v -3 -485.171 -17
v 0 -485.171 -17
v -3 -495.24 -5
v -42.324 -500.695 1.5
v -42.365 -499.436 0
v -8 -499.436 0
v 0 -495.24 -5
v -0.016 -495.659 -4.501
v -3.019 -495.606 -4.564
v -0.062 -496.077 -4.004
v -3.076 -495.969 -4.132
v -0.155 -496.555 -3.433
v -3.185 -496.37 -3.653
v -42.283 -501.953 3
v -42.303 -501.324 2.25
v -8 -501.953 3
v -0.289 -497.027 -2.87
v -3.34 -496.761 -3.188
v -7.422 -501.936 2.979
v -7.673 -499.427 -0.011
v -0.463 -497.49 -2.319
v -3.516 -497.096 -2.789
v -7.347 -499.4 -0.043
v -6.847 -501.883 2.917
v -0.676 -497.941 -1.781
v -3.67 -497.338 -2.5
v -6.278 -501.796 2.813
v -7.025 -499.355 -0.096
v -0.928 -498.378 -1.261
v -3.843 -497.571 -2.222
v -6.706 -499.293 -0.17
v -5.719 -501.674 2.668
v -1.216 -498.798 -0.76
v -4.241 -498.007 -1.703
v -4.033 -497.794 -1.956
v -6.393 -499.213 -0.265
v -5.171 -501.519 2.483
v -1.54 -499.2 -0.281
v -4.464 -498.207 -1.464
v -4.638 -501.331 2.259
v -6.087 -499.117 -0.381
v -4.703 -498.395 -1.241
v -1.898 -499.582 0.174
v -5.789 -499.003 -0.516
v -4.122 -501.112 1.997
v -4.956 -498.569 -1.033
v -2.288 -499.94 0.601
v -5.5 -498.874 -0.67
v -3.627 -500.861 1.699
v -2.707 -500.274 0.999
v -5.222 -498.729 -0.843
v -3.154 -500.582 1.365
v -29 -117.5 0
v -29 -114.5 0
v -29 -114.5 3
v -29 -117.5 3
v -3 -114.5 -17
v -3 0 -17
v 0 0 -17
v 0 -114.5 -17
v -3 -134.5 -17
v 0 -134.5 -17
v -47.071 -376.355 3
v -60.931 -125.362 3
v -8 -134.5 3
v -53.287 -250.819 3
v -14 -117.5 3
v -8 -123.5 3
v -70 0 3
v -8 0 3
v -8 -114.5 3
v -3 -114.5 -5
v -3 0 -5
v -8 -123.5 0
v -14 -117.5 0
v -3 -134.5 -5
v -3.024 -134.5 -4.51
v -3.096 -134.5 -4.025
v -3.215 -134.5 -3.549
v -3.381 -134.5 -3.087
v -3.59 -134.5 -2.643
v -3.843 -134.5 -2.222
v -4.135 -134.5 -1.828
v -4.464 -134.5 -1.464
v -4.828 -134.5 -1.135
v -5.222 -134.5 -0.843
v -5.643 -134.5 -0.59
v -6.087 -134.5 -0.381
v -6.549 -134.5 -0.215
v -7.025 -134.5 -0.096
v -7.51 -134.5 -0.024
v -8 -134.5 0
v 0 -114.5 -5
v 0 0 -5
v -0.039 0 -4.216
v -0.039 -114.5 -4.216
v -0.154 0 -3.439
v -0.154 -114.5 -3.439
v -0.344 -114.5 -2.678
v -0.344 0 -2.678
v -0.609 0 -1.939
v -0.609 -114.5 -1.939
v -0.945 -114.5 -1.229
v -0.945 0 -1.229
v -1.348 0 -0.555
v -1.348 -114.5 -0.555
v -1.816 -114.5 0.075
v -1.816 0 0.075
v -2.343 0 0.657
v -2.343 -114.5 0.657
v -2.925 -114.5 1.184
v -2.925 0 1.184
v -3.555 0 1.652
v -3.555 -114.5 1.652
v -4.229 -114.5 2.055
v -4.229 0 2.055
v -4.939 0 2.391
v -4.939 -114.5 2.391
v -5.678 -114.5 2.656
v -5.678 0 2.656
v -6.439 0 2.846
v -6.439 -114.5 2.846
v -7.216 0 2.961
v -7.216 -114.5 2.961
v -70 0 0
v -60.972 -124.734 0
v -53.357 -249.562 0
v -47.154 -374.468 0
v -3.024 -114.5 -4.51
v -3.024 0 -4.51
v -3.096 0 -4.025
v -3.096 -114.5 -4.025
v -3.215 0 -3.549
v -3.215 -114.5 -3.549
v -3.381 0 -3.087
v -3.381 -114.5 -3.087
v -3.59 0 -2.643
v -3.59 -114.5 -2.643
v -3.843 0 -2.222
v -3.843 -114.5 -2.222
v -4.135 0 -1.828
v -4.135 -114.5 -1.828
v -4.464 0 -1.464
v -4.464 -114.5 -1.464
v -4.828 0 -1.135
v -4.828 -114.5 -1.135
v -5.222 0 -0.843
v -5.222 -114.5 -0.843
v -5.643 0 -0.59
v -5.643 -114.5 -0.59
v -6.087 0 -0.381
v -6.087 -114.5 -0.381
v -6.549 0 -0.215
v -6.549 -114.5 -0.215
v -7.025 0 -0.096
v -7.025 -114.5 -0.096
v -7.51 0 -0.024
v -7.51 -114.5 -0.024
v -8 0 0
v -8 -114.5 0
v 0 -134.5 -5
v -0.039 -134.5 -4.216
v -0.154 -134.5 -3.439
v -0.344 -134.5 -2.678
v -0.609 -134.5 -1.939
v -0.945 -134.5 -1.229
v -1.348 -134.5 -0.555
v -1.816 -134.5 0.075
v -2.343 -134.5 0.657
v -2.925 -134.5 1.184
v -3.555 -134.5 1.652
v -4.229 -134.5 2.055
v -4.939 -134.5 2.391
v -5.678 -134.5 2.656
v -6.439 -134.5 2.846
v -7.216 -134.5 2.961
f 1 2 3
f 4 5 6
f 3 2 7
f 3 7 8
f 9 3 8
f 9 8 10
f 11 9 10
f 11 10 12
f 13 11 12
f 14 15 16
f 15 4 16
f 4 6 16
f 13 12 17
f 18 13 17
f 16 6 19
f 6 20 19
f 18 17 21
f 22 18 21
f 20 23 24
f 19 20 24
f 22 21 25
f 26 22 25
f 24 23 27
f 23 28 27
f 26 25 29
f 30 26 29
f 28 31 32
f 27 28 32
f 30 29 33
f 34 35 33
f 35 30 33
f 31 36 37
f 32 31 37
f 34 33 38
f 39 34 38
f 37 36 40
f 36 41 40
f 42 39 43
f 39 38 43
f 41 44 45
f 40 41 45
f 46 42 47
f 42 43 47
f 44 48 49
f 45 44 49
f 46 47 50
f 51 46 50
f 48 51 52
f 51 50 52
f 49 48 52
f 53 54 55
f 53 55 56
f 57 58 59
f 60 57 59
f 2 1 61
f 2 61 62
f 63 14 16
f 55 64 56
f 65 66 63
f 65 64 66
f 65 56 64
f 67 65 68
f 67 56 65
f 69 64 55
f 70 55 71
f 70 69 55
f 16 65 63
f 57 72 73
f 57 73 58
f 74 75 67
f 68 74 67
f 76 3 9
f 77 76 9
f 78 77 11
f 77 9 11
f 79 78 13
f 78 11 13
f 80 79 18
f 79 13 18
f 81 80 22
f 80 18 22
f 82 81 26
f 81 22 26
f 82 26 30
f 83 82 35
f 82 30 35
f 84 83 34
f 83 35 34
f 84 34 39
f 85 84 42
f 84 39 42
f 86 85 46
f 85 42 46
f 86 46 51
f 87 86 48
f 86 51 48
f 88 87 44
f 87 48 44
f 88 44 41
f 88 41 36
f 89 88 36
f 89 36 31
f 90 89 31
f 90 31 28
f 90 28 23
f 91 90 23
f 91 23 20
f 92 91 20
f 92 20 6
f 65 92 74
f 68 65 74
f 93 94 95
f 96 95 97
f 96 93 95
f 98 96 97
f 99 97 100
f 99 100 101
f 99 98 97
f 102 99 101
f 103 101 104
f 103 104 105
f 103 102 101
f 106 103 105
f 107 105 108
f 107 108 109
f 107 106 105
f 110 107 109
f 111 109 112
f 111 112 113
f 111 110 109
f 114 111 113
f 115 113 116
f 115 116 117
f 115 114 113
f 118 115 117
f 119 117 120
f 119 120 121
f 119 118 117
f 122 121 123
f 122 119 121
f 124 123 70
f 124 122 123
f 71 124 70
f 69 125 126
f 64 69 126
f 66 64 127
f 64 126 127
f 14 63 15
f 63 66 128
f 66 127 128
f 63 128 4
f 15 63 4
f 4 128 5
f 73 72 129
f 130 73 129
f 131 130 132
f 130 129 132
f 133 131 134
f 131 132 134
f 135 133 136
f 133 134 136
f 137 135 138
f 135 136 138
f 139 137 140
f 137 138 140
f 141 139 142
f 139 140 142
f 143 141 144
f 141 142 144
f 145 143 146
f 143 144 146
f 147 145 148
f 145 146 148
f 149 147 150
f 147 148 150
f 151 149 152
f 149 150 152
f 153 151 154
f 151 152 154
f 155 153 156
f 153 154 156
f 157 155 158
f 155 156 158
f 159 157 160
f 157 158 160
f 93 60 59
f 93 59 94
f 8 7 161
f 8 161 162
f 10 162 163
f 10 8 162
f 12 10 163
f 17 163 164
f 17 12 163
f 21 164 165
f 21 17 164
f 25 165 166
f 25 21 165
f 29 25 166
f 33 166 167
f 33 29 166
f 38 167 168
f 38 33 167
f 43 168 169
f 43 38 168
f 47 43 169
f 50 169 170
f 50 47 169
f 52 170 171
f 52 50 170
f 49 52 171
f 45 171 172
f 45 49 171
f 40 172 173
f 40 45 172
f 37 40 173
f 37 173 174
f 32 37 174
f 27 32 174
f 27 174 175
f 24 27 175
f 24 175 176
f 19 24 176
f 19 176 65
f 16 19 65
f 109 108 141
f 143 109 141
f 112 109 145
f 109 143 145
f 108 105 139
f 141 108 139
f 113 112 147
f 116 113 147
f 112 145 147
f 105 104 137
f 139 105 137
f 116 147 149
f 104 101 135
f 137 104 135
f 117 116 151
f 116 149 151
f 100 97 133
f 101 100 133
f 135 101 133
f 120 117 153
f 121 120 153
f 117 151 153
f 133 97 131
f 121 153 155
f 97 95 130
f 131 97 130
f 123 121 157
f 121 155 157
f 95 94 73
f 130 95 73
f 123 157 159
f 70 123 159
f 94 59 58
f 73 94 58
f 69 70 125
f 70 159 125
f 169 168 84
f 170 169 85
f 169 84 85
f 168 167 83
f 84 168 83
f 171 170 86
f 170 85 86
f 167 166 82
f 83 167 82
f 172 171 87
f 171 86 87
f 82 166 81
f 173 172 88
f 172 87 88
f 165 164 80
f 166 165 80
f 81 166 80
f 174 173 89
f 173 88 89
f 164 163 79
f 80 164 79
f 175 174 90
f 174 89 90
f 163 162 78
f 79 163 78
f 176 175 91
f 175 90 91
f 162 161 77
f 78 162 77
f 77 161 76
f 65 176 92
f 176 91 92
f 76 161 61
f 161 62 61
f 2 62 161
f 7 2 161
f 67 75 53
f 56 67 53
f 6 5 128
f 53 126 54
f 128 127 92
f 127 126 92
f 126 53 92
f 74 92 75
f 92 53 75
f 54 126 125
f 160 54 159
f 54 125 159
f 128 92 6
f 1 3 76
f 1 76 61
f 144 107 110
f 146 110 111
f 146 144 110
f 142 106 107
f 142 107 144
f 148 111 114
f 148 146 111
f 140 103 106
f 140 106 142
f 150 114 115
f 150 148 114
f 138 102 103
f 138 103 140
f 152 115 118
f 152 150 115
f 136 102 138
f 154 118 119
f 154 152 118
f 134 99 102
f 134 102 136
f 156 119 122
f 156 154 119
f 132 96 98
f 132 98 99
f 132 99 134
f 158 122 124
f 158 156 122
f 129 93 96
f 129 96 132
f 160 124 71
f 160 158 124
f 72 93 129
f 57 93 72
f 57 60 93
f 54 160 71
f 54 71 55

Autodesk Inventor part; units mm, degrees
ref_plane "YZ Plane" through (0, 0, 0) normal (1, 0, 0) x (0, 1, 0)
ref_plane "XZ Plane" through (0, 0, 0) normal (0, 1, 0) x (-1, 0, 0)
ref_plane "XY Plane" through (0, 0, 0) normal (0, 0, 1) x (1, 0, 0)
sketch "Sketch1" plane through (0, 0, 0) normal (0, 0, 1) x (1, 0, 0)
  arc A0 (-71.9586, -1745.1712) -> (-70, 0) centre (-11089.4751, -860.2193) ccw
  line L0 (0, 0) -> (-70, 0)
  line L1 (0, -117.9106) -> (-61.4296, -117.9106) construction
  line L2 (0, -617.9106) -> (-39.1314, -617.9106) construction
  line L3 (0, -1117.9106) -> (-39.4794, -1117.9106) construction
  line L4 (0, -1617.9106) -> (-62.4758, -1617.9106) construction
  line L5 (-71.9586, -1745.1712) -> (0, -1745.1712)
  line L6 (0, 0) -> (0, -1745.1712)
  line L7 (0, -1735.1712) -> (-10.3553, -1745.1712)
  point P0 (-20, 0)
  dimension "d33" = 50
  dimension "d58" = 500
  dimension "d59" = 500
  dimension "d60" = 500
  dimension "d141" = 1745.171
  dimension "d148" = 70
  dimension "d149" = 11053
  dimension "d150" = 71.959
  dimension "d151" = 136
  dimension "d153" = 10
extrude "Plate3" add sketch "Sketch1" along normal blind 3 contours A0 L0 L6 L7 L5
sketch "Sketch3" plane through (-3, 0, 3) normal (1, 0, 0) x (0, 1, 0)
  line L0 (-1735.1712, 0) -> (0, 0)
  line L1 (0, 0) -> (0, 20)
  line L2 (0, 20) -> (-1735.1712, 20)
  line L3 (-1735.1712, 20) -> (-1735.1712, 0)
edge flange "Flange2" height 20 angle 90 thickness 3 bend radius 5 thickness toward (1, 0, 0) relief round relief width 3 relief depth 1.5 edges at (0, -867.5856, 3) wall of the first edge with corners at (-3, -1735.1712, 3) (-3, 0, 3) (-3, 0, -17) (-3, -1735.1712, -17)
bend "Bend2"
corner "Corner2"
sketch "Sketch5" plane through (0, 0, 0) normal (0, 0, 1) x (1, 0, 0)
  line L0 (-8, -1742.8967) -> (-8, 0) projected
  line L1 (-70, 0) -> (-8, 0) projected
  arc A0 (-71.9586, -1745.1712) -> (-70, 0) centre (-11089.4751, -860.2193) ccw projected
  line L2 (0, 0) -> (0, -1735.1712) projected
  line L3 (0, -114.5) -> (-29, -114.5)
  line L4 (0, -117.5) -> (-3, -117.5) construction
  line L5 (-3, -1735.1712) -> (-3, 0) projected
  line L6 (-29, -114.5) -> (-29, -117.5)
  line L7 (0, -614.5) -> (-39.2067, -614.5) construction
  line L8 (0, -1114.5) -> (-39.4004, -1114.5) construction
  line L9 (0, -1614.5) -> (-62.242, -1614.5) construction
  line L10 (-10.3553, -1745.1712) -> (-71.9586, -1745.1712) projected
  line L11 (0, -114.5) -> (0, -134.5)
  line L12 (-3, -114.5) -> (-3, -117.5) construction
  line L13 (0, -134.5) -> (-3, -134.5)
  line L14 (-29, -114.5) -> (-61.6597, -114.5) construction
  line L15 (-29, -117.5) -> (-61.4573, -117.5) construction
  line L16 (-3, -117.5) -> (-3, -134.5)
  line L17 (-3, -117.5) -> (-29, -117.5)
  line L18 (-3, -134.5) -> (-8, -134.5)
  line L19 (-8, -1742.8967) -> (-10.3553, -1745.1712) projected
  point P0 (0, 0)
  point P1 (845.25, -380.4205)
  point P2 (848, -380.4205)
  point P3 (-29, -116)
  point P4 (850, -410.4205)
  point P5 (-3, -114.5)
  point P6 (-3, -134.5)
  point P7 (-8, -117.5)
  dimension "d69" = 1735.1712
  dimension "d70" = 3
  dimension "d76" = 61.6598
  dimension "d80" = 39.2067
  dimension "d102" = 62.242
  dimension "d104" = 39.4004
  dimension "d106" = 3
  dimension "d107" = 20
  dimension "d108" = 116
  dimension "d112" = 29
  dimension "d142" = 500
  dimension "d143" = 500
  dimension "d144" = 500
extrude "Extrusion2" cut sketch "Sketch5" along normal through all both and the other way through all contours L0 L17 L5 L18 | L17 L6 L3 L0 | L0 L3 L5 L17 | L5 L3 L2 L13
pattern_linear "Rectangular Pattern3" count 4 spacing 500 along (0, -1, 0) of "Extrusion2"
chamfer "Corner Chamfer1" distance 6 angle 45 3 edges at (-8, -1617.5, 1.5) (-8, -1117.5, 1.5) (-8, -117.5, 1.5)
sketch "Sketch7" plane through (0, -1614.5, -17) normal (1, 0, 0) x (0, 0, -1)
  line L0 (-17, -130.6712) -> (-20, -130.6712) projected
  line L1 (0, 1000) -> (0, 1480) projected
  line L2 (-20, -130.6712) -> (0, -130.6712)
  line L3 (0, -130.6712) -> (0, 1129.3288)
  line L4 (0, 1129.3288) -> (-20, 1129.3288)
  line L5 (-20, 1129.3288) -> (-20, -130.6712)
  line L6 (0, 1129.3288) -> (-20, 1112.5468)
  point P0 (-17, 1614.5)
  point P1 (0, 1000)
  dimension "d154" = 1260
  dimension "d157" = 40
extrude "Extrusion3" cut sketch "Sketch7" against normal through all contours L0 L5 L6 L1 L3 L2
equation "\"d33\" = d25"
equation "\"БОРТ_стрингер_3_высота\" = 62"
equation "\"БОРТ_стрингер_4_высота\" = 39"
equation "\"БОРТ_стрингер_5_высота\" = 39"
equation "\"БОРТ_стрингер_6_высота\" = 62"
equation "\"d25\" = 50"
properties part number "MSC 313 RIB HIP" material "Stainless Steel"
